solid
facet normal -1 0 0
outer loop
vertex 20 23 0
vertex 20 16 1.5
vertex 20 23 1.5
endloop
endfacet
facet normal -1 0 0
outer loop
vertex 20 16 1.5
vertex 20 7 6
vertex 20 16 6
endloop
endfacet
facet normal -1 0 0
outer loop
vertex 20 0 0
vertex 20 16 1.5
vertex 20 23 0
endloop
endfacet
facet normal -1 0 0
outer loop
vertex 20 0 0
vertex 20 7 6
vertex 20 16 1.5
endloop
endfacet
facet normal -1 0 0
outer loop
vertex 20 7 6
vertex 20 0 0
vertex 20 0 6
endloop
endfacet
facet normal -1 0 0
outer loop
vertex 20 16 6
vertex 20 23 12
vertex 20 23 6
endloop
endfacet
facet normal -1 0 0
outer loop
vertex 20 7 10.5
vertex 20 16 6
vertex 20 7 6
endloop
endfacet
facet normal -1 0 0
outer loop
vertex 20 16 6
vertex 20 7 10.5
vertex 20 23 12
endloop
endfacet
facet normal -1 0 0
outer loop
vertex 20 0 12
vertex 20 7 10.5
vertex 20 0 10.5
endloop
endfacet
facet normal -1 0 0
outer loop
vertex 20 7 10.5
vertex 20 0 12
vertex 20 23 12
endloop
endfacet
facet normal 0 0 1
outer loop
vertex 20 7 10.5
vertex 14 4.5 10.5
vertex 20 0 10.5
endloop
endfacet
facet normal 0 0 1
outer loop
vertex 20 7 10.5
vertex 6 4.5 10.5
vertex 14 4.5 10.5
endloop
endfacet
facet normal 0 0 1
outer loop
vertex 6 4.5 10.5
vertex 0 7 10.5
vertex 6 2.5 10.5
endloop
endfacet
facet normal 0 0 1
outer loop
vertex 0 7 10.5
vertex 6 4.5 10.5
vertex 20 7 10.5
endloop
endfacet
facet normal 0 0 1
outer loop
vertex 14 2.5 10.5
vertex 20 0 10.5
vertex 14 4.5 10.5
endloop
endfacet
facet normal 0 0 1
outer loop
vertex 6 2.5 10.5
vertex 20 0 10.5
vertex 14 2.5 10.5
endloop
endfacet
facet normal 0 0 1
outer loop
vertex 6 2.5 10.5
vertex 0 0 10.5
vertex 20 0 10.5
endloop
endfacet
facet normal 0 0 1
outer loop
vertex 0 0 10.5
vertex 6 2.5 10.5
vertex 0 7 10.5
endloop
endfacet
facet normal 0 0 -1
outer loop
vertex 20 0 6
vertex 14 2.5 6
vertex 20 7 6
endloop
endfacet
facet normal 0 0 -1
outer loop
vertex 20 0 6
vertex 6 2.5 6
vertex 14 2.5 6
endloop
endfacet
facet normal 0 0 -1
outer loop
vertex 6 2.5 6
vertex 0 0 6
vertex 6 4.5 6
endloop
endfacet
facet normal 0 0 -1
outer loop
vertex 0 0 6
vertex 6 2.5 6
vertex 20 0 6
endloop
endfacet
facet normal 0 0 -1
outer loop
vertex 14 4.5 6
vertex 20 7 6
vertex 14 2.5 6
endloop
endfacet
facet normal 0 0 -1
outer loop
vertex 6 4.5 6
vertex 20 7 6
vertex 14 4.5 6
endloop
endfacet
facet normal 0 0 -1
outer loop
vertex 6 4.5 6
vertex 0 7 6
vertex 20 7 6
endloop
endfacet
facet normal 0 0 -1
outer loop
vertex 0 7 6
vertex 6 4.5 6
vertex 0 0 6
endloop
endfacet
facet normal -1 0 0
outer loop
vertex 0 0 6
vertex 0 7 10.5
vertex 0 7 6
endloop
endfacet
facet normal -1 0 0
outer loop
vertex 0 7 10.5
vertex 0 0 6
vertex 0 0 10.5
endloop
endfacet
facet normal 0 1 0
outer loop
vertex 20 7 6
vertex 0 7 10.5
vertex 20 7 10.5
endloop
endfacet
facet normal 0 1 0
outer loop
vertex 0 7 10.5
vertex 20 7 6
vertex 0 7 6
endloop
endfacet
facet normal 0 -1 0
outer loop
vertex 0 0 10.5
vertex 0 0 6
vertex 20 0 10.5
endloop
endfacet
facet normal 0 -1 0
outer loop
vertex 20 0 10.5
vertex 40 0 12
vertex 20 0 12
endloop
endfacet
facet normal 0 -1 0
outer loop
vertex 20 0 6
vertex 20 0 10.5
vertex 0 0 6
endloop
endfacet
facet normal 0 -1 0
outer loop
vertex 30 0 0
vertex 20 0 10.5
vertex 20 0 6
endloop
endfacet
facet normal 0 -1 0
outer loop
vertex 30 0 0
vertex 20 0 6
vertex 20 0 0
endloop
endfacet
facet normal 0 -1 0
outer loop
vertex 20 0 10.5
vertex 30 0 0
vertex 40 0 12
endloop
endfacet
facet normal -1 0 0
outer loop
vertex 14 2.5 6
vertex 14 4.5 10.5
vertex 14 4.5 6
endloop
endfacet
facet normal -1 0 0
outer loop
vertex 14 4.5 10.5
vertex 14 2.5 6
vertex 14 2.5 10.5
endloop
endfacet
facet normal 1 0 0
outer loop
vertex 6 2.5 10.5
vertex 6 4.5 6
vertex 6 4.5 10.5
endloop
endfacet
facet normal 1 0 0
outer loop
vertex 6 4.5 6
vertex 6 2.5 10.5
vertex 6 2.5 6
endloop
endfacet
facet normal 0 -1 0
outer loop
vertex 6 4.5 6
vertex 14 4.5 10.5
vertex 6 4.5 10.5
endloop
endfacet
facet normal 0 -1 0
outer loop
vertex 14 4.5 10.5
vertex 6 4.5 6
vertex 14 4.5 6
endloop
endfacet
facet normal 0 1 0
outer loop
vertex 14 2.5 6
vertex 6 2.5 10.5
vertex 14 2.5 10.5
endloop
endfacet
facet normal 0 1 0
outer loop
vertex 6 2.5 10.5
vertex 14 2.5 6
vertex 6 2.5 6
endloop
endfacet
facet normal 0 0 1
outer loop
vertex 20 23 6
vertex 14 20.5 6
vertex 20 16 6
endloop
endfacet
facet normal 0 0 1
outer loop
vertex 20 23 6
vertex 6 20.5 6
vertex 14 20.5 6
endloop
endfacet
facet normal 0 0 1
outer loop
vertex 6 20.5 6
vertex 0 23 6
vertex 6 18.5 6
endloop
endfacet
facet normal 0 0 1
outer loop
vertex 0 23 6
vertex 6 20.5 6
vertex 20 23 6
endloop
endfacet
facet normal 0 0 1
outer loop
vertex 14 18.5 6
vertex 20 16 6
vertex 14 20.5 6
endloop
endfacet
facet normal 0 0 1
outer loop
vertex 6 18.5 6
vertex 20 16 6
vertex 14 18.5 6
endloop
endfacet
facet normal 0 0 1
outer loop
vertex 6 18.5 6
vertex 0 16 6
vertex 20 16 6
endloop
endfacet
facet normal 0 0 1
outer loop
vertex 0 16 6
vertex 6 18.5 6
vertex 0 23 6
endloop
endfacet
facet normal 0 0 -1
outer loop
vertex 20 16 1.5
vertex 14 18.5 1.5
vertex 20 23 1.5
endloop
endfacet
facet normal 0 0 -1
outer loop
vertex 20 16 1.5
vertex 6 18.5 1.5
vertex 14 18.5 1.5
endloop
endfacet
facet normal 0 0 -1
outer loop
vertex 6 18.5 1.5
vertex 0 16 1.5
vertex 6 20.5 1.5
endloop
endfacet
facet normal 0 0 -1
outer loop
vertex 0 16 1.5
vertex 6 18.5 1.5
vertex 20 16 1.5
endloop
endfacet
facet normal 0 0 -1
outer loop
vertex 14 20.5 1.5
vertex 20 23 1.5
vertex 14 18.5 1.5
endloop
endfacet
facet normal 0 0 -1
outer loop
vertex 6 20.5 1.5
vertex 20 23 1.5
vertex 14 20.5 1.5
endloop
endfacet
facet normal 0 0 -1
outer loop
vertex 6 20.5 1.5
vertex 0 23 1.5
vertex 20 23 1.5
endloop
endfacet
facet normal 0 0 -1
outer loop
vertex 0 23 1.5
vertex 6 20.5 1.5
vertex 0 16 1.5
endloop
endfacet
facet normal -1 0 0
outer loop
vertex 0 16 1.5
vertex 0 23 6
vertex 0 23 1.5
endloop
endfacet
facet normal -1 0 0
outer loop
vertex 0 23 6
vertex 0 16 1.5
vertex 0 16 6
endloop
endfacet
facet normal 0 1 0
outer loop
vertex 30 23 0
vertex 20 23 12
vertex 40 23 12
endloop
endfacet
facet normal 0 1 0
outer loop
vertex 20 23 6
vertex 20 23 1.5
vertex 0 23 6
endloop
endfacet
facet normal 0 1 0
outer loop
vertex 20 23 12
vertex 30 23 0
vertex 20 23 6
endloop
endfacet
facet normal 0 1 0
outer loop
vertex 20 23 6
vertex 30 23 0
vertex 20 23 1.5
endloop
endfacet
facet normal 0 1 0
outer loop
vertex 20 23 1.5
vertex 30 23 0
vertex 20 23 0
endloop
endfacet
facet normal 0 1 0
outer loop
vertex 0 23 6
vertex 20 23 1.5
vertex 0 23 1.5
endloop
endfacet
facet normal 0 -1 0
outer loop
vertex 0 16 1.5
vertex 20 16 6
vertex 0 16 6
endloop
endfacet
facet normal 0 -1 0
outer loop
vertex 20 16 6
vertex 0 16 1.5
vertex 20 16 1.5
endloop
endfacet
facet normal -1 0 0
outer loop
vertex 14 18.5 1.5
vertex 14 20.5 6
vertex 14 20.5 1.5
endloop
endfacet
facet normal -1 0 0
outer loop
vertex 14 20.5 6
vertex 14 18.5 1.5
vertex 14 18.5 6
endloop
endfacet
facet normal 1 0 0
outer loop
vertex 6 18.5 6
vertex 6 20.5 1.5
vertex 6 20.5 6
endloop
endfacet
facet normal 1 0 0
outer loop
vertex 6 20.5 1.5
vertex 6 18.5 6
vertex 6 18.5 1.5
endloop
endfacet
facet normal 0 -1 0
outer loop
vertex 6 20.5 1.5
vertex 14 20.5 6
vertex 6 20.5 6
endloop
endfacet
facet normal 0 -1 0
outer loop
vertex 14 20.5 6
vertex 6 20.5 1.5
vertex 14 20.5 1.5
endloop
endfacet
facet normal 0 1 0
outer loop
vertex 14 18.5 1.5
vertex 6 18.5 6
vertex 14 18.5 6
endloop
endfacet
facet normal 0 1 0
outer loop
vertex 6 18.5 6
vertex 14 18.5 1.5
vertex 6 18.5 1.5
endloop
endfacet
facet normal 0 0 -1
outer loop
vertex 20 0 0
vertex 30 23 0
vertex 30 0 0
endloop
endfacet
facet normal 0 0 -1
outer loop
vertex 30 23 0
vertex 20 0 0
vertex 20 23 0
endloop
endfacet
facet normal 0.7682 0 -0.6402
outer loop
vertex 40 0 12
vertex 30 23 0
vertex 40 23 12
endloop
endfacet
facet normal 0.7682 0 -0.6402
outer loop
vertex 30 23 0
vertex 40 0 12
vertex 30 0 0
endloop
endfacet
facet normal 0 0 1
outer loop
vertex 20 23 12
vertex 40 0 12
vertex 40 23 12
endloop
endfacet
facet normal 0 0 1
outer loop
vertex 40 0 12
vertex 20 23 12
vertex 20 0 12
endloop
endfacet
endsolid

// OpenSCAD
ba=10;
bb=10;
bw=23;
bl = ba + bb;
bh=12;

al = 20;
aw = 7;
ah = 4.5;
ail = 8;
aiw = 2;

az = 1.5;

module a() {
    translate([al/2, aw/2, ah/2])
        difference() {
            cube([al, aw, ah], center = true);
            cube([ail, aiw, ah + 0.1], center = true);
        }
}

module b() {
    translate([0, bw, 0])
        rotate([90, 0, 0])
            linear_extrude(height = bw)
                polygon([ [0, 0], [ba, 0], [bl, bh], [0, bh] ]);
}

translate([0, 0, bh - ah - az]) a();
translate([0, bw - aw, az]) a();
translate([al, 0, 0]) b();
